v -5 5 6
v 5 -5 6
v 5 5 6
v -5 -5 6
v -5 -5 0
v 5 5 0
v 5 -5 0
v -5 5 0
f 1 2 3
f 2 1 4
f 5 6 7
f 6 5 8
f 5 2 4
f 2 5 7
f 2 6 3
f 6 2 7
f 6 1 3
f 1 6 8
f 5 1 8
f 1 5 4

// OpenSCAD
// brick 2x2

// external vars #########################

ext_scale = 1.0;
ext_fn = 12;

// part ##################################

module brick_2x2(m_scale=ext_scale,m_fn=ext_fn) {
    scale([m_scale,m_scale,m_scale])
    translate([-5,-5,0])
    cube([10,10,6],center=false);
}

brick_2x2();
